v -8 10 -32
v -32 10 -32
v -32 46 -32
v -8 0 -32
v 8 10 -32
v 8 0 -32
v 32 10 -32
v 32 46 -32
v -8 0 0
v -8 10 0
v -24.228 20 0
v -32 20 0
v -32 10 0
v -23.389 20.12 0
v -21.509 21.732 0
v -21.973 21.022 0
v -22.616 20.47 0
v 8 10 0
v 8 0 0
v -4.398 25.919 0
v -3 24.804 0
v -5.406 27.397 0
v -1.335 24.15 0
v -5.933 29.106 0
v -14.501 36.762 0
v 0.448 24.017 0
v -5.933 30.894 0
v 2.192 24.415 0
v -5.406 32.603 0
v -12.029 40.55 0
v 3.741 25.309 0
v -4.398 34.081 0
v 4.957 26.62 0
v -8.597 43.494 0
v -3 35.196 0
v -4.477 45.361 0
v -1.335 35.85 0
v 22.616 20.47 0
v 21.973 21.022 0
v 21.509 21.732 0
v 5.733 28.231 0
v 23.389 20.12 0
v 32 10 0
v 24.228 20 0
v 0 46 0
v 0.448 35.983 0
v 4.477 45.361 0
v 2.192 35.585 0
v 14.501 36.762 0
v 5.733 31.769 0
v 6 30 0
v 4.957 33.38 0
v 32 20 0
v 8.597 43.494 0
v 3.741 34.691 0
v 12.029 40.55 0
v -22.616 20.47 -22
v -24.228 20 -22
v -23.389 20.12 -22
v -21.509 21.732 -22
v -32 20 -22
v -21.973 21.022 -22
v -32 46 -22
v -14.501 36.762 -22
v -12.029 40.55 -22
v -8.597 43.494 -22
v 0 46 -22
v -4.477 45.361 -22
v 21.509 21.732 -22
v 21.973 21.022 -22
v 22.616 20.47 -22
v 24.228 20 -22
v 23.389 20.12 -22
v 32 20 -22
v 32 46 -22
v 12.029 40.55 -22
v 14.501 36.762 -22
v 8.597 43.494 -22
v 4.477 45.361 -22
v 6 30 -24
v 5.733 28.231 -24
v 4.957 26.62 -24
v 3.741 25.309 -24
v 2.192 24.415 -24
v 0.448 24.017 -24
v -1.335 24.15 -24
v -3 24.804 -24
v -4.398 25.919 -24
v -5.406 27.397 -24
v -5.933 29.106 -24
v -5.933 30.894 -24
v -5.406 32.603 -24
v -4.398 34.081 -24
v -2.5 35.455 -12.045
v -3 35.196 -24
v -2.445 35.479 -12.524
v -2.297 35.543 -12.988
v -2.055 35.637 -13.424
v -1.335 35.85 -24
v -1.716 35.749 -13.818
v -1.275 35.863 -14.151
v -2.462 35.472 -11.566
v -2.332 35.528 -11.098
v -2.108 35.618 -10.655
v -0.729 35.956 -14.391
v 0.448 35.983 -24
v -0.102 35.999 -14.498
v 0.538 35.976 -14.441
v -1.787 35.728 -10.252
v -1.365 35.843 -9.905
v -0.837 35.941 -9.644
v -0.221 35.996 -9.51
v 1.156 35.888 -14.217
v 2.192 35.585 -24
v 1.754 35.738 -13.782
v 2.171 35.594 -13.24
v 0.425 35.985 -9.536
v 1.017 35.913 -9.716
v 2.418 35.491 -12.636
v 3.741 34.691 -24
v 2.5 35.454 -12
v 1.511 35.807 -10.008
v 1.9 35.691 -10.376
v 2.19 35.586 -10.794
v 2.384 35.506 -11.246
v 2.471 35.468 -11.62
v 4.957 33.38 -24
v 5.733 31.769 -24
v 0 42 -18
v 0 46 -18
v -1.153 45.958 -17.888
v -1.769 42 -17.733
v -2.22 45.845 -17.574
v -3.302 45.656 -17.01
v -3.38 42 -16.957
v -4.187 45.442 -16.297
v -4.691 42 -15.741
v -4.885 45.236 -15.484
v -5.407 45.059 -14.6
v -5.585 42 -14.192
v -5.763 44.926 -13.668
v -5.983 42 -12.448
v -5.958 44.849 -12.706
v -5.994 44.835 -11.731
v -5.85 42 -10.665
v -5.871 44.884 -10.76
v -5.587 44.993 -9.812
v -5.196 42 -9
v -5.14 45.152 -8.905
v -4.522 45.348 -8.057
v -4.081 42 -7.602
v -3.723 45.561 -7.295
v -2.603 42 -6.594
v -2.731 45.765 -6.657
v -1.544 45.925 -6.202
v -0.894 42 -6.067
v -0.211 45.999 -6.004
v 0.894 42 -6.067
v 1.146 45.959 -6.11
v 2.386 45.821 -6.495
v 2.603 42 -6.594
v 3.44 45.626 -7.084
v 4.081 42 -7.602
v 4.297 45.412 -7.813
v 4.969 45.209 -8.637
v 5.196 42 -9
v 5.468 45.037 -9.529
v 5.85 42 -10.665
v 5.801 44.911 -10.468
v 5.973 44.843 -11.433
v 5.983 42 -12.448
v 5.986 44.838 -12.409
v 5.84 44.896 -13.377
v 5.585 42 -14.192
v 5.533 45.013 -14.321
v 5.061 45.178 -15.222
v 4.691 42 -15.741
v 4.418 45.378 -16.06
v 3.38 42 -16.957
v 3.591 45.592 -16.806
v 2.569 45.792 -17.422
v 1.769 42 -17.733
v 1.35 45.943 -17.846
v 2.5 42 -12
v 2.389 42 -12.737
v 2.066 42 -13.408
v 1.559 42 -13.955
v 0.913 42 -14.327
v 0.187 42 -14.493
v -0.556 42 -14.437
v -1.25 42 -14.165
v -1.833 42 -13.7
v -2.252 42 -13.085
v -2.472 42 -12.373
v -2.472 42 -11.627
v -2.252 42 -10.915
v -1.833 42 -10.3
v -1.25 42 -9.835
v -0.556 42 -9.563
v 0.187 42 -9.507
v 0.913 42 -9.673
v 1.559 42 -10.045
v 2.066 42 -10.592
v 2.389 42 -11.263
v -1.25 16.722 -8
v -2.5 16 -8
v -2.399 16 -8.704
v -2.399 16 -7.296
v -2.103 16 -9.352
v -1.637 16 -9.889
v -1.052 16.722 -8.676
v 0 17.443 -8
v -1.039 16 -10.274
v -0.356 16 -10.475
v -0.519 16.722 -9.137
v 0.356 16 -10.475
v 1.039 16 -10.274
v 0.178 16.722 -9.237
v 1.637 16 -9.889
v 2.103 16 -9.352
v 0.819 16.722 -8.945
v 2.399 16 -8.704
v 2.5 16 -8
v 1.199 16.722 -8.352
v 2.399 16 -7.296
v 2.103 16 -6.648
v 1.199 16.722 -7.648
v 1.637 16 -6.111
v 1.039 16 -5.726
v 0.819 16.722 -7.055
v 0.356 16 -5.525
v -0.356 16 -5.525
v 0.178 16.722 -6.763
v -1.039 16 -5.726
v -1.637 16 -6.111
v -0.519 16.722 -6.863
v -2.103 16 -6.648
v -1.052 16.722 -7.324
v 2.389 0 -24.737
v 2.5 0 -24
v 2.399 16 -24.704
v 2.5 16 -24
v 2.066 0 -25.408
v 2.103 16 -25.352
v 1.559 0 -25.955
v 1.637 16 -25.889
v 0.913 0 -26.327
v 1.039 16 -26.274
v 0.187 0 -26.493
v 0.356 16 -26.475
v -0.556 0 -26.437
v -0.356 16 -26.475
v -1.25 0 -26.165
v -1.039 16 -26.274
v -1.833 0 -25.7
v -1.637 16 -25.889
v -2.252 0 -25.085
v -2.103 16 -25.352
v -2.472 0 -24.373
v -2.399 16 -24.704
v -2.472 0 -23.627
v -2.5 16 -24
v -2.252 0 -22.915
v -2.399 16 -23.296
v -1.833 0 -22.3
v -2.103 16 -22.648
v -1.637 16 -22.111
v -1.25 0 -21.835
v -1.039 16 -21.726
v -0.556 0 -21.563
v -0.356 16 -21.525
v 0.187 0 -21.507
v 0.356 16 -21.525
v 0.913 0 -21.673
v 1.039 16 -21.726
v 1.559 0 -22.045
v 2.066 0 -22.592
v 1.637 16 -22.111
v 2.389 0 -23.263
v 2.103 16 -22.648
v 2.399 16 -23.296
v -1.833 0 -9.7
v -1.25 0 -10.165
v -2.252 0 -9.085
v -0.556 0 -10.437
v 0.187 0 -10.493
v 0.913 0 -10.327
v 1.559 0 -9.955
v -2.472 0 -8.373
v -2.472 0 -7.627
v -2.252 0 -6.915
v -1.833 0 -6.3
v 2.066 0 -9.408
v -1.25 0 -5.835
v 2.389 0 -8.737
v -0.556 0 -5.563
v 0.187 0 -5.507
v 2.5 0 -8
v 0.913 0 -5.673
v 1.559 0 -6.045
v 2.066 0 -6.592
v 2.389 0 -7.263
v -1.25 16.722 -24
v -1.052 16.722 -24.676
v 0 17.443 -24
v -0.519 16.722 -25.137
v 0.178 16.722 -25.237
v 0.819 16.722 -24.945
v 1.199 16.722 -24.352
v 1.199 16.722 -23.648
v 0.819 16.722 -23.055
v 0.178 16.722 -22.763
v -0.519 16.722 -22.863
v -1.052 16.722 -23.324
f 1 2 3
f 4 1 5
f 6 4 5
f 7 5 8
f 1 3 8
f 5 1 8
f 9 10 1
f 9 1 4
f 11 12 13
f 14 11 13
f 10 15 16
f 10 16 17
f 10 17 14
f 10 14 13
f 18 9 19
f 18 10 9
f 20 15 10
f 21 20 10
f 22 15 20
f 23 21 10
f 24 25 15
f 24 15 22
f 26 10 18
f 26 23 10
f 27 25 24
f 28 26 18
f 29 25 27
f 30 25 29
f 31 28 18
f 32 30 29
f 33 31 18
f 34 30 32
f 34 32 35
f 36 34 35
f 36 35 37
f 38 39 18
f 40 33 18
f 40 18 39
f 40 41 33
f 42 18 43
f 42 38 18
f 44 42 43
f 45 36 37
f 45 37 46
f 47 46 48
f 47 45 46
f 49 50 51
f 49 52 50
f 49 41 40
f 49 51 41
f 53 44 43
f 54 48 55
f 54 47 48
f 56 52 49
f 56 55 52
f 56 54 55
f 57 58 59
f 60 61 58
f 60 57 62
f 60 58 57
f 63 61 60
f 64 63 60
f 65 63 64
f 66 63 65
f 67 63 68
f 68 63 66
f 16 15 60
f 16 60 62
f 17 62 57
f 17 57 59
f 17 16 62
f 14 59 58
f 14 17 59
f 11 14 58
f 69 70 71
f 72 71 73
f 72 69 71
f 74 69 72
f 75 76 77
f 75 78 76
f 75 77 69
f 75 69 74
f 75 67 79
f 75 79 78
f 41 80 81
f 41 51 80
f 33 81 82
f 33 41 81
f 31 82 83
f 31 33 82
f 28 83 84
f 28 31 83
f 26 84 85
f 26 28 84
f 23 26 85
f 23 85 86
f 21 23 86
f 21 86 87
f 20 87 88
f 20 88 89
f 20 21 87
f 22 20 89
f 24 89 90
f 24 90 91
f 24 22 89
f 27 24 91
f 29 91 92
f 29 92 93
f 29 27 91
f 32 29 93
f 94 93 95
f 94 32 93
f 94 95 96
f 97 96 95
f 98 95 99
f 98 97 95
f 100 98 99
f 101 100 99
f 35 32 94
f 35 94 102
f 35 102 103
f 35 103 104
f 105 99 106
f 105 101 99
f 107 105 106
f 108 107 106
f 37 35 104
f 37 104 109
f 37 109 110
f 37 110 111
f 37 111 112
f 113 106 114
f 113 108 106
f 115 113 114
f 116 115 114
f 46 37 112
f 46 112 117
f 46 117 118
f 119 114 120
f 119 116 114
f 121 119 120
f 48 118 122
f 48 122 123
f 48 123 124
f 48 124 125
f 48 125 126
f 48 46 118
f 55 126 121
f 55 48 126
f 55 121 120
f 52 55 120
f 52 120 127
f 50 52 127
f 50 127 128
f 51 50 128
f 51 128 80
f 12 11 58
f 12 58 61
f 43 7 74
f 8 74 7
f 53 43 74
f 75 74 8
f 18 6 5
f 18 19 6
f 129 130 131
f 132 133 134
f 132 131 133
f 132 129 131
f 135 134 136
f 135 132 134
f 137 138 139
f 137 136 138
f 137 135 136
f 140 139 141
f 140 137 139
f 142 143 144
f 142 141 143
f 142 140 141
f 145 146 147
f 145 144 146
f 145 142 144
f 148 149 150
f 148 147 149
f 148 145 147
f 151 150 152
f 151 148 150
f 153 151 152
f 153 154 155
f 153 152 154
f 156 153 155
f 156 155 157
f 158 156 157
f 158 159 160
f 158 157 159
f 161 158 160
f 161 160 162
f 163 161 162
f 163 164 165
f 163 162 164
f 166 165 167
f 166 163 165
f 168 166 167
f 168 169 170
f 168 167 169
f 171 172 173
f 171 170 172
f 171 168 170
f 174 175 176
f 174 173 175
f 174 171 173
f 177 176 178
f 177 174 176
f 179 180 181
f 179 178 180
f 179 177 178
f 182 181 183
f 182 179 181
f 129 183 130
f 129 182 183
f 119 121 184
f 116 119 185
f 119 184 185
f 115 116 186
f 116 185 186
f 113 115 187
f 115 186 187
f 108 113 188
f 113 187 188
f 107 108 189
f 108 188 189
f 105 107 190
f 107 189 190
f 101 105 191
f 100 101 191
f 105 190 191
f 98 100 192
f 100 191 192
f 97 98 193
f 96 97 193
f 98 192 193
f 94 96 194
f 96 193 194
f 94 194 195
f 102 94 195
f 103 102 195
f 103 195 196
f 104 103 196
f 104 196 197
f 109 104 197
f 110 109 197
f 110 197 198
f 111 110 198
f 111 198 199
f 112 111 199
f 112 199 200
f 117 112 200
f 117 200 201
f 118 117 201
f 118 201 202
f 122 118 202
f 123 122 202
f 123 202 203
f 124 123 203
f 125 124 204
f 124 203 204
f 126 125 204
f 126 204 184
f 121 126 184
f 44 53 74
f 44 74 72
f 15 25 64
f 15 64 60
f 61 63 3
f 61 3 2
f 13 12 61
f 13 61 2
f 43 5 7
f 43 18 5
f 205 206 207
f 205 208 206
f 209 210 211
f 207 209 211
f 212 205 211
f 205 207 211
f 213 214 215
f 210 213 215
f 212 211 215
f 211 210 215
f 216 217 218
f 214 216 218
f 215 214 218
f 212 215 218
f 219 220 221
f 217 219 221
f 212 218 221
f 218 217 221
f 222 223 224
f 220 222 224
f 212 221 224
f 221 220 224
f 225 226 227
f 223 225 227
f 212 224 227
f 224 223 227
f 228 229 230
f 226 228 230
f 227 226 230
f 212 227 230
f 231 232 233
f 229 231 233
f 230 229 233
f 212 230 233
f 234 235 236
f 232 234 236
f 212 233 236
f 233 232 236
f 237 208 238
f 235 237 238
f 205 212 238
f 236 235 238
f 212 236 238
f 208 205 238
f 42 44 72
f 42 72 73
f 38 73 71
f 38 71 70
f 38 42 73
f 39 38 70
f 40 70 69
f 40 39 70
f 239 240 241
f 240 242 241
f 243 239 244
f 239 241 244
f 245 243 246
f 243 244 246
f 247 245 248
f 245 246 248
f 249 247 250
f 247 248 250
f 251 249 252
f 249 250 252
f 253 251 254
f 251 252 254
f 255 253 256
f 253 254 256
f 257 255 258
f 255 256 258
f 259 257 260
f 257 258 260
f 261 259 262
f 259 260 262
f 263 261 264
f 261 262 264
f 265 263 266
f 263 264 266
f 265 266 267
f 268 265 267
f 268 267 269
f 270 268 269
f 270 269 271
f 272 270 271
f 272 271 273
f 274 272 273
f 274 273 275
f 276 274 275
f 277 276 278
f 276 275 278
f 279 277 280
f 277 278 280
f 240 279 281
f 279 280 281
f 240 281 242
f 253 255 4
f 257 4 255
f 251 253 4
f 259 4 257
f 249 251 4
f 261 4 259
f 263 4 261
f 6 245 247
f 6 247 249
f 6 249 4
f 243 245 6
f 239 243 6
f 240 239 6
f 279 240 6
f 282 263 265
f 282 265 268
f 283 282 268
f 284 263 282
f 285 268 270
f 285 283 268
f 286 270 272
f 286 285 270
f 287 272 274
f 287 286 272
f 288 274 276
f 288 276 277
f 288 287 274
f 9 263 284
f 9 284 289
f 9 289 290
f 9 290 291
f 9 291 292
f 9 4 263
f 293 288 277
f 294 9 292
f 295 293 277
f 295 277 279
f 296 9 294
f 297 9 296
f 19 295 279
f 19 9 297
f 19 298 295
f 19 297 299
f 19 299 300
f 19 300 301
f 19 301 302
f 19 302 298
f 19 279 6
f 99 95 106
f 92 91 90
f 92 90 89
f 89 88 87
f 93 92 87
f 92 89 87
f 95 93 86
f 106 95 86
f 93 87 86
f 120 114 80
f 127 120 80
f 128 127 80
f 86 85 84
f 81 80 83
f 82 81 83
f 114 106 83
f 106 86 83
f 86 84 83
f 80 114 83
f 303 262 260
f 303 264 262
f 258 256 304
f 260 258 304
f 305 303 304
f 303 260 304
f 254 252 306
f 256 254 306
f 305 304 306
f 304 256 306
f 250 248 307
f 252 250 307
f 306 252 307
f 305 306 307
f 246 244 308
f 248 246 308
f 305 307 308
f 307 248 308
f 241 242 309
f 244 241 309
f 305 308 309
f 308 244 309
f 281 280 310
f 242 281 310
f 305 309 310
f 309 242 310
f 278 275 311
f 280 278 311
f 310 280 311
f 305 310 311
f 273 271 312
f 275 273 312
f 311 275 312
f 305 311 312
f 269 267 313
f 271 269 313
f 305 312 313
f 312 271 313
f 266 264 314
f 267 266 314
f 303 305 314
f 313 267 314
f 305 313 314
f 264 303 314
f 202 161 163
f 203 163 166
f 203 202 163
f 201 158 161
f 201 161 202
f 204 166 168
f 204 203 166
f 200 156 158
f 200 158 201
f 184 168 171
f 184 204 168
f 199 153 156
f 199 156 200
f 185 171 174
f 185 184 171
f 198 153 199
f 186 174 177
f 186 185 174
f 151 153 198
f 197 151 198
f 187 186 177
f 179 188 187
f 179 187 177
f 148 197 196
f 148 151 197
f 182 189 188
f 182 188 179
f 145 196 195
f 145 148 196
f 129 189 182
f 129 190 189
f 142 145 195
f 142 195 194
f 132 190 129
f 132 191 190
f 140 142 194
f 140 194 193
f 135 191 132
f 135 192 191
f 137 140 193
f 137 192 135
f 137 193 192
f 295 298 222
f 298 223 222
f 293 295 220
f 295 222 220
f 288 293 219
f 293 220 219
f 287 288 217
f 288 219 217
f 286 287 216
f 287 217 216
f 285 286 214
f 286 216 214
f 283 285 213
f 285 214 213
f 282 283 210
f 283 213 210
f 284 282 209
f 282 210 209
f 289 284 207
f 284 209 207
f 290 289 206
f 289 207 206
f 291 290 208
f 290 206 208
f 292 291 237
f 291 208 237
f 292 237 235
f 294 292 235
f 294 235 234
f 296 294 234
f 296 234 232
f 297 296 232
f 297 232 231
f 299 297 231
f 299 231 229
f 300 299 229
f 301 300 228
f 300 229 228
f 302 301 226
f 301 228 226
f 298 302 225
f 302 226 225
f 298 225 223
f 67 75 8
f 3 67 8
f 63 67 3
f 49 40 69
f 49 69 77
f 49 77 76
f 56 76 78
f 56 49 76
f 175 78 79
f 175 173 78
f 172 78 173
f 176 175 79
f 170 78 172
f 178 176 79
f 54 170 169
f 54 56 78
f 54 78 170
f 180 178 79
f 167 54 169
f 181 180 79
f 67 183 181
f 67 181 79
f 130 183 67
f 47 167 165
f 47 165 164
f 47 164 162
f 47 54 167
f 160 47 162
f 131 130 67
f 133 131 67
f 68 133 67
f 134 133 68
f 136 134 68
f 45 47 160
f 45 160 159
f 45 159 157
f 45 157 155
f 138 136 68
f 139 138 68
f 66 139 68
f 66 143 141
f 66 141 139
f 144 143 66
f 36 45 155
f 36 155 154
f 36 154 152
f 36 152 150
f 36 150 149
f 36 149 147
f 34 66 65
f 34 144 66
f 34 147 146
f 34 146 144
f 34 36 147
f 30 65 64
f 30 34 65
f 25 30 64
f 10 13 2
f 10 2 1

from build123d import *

# Parameters (mm, degrees)
SKETCH1_R                  = 6
BOSS_EXTRUDE1_DEPTH        = 22
SKETCH2_R                  = 6
BOSS_EXTRUDE2_DEPTH        = 10
BOSS_EXTRUDE3_START        = -8
SKETCH3_R                  = 6
BOSS_EXTRUDE3_DEPTH        = 8
M6X1_0_TAPPED_HOLE1_D      = 5
M6X1_0_TAPPED_HOLE1_DEPTH  = 16
M6X1_0_TAPPED_HOLE1_TIP    = 1.443375673
SKETCH6_R                  = 6
CUT_EXTRUDE1_DEPTH         = 4
M6X1_0_TAPPED_HOLE2_REACH  = 63.741
M6X1_0_TAPPED_HOLE2_BORE_R = 2.5


with BuildPart() as part:
    # Sketch1 → Boss-Extrude1 (new body)
    with BuildSketch(Plane.XY):
        with BuildLine():
            Line((-8, 0), (8, 0))
            Line((8, 0), (8, 10))
            Line((8, 10), (32, 10))
            Line((32, 10), (32, 20))
            Line((32, 20), (24.228334067, 20))
            ThreePointArc((24.228334067, 20), (22.616435242, 20.469825663), (21.509410706, 21.732145215))
            Line((21.509410706, 21.732145215), (14.500924593, 36.761892188))
            ThreePointArc((14.500924593, 36.761892188), (0, 46), (-14.500924593, 36.761892188))
            Line((-14.500924593, 36.761892188), (-21.509410706, 21.732145215))
            ThreePointArc((-21.509410706, 21.732145215), (-22.616435242, 20.469825663), (-24.228334067, 20))
            Line((-24.228334067, 20), (-32, 20))
            Line((-32, 20), (-32, 10))
            Line((-32, 10), (-8, 10))
            Line((-8, 10), (-8, 0))
        make_face()
        with Locations((0, 30)):
            Circle(SKETCH1_R, mode=Mode.SUBTRACT)
    extrude(amount=-BOSS_EXTRUDE1_DEPTH)

    # Sketch2 → Boss-Extrude2 (add)
    with BuildSketch(Plane(origin=(0, 0, -22), x_dir=(-1, 0, 0), z_dir=(0, 0, -1))):
        Polygon((-32, 10), (-32, 46), (32, 46), (32, 10), (8, 10), (8, 0), (-8, 0), (-8, 10), align=None)
        with Locations(Location((0, 30, 0), (0, 0, 180))):
            Circle(SKETCH2_R, mode=Mode.SUBTRACT)
    extrude(amount=BOSS_EXTRUDE2_DEPTH)

    # Sketch3 → Boss-Extrude3 (add)
    with BuildSketch(Plane(origin=(0, 0, -32), x_dir=(-1, 0, 0), z_dir=(0, 0, -1)).offset(BOSS_EXTRUDE3_START)):
        with Locations(Location((0, 30, 0), (0, 0, 180))):
            Circle(SKETCH3_R)
    extrude(amount=BOSS_EXTRUDE3_DEPTH)

    # M6x1.0 Tapped Hole1
    with Locations(Plane(origin=(0, 0, 0), x_dir=(-1, 0, 0), z_dir=(0, -1, 0))):
        with Locations((0, 8), (0, 24)):
            Hole(M6X1_0_TAPPED_HOLE1_D / 2, depth=M6X1_0_TAPPED_HOLE1_DEPTH)
            with Locations((0, 0, -(M6X1_0_TAPPED_HOLE1_DEPTH + M6X1_0_TAPPED_HOLE1_TIP / 2))):  # 120° drill point
                Cone(0, M6X1_0_TAPPED_HOLE1_D / 2, M6X1_0_TAPPED_HOLE1_TIP, mode=Mode.SUBTRACT)

    # Sketch6 → Cut-Extrude1 (cut)
    with BuildSketch(Plane(origin=(0, 42, 0), x_dir=(1, 0, 0), z_dir=(0, 1, 0))):
        with Locations(Location((0, 12, 0), (0, 0, 90))):
            Circle(SKETCH6_R)
    extrude(amount=CUT_EXTRUDE1_DEPTH, mode=Mode.SUBTRACT)

    # M6x1.0 Tapped Hole2 bore → M6x1.0 Tapped Hole2 (cut, up to next)
    with BuildSketch(Plane(origin=(0, 42, 0), x_dir=(1, 0, 0), z_dir=(0, 1, 0)), mode=Mode.PRIVATE) as m6x1_0_tapped_hole2_sk1:
        with Locations((0, 12)):
            Circle(M6X1_0_TAPPED_HOLE2_BORE_R)
    m6x1_0_tapped_hole2_tool1 = extrude(m6x1_0_tapped_hole2_sk1.sketch, amount=-M6X1_0_TAPPED_HOLE2_REACH, mode=Mode.PRIVATE) & part.part
    add(m6x1_0_tapped_hole2_tool1.solids().sort_by_distance((0, 42, -12))[0], mode=Mode.SUBTRACT)


solid = part.part
